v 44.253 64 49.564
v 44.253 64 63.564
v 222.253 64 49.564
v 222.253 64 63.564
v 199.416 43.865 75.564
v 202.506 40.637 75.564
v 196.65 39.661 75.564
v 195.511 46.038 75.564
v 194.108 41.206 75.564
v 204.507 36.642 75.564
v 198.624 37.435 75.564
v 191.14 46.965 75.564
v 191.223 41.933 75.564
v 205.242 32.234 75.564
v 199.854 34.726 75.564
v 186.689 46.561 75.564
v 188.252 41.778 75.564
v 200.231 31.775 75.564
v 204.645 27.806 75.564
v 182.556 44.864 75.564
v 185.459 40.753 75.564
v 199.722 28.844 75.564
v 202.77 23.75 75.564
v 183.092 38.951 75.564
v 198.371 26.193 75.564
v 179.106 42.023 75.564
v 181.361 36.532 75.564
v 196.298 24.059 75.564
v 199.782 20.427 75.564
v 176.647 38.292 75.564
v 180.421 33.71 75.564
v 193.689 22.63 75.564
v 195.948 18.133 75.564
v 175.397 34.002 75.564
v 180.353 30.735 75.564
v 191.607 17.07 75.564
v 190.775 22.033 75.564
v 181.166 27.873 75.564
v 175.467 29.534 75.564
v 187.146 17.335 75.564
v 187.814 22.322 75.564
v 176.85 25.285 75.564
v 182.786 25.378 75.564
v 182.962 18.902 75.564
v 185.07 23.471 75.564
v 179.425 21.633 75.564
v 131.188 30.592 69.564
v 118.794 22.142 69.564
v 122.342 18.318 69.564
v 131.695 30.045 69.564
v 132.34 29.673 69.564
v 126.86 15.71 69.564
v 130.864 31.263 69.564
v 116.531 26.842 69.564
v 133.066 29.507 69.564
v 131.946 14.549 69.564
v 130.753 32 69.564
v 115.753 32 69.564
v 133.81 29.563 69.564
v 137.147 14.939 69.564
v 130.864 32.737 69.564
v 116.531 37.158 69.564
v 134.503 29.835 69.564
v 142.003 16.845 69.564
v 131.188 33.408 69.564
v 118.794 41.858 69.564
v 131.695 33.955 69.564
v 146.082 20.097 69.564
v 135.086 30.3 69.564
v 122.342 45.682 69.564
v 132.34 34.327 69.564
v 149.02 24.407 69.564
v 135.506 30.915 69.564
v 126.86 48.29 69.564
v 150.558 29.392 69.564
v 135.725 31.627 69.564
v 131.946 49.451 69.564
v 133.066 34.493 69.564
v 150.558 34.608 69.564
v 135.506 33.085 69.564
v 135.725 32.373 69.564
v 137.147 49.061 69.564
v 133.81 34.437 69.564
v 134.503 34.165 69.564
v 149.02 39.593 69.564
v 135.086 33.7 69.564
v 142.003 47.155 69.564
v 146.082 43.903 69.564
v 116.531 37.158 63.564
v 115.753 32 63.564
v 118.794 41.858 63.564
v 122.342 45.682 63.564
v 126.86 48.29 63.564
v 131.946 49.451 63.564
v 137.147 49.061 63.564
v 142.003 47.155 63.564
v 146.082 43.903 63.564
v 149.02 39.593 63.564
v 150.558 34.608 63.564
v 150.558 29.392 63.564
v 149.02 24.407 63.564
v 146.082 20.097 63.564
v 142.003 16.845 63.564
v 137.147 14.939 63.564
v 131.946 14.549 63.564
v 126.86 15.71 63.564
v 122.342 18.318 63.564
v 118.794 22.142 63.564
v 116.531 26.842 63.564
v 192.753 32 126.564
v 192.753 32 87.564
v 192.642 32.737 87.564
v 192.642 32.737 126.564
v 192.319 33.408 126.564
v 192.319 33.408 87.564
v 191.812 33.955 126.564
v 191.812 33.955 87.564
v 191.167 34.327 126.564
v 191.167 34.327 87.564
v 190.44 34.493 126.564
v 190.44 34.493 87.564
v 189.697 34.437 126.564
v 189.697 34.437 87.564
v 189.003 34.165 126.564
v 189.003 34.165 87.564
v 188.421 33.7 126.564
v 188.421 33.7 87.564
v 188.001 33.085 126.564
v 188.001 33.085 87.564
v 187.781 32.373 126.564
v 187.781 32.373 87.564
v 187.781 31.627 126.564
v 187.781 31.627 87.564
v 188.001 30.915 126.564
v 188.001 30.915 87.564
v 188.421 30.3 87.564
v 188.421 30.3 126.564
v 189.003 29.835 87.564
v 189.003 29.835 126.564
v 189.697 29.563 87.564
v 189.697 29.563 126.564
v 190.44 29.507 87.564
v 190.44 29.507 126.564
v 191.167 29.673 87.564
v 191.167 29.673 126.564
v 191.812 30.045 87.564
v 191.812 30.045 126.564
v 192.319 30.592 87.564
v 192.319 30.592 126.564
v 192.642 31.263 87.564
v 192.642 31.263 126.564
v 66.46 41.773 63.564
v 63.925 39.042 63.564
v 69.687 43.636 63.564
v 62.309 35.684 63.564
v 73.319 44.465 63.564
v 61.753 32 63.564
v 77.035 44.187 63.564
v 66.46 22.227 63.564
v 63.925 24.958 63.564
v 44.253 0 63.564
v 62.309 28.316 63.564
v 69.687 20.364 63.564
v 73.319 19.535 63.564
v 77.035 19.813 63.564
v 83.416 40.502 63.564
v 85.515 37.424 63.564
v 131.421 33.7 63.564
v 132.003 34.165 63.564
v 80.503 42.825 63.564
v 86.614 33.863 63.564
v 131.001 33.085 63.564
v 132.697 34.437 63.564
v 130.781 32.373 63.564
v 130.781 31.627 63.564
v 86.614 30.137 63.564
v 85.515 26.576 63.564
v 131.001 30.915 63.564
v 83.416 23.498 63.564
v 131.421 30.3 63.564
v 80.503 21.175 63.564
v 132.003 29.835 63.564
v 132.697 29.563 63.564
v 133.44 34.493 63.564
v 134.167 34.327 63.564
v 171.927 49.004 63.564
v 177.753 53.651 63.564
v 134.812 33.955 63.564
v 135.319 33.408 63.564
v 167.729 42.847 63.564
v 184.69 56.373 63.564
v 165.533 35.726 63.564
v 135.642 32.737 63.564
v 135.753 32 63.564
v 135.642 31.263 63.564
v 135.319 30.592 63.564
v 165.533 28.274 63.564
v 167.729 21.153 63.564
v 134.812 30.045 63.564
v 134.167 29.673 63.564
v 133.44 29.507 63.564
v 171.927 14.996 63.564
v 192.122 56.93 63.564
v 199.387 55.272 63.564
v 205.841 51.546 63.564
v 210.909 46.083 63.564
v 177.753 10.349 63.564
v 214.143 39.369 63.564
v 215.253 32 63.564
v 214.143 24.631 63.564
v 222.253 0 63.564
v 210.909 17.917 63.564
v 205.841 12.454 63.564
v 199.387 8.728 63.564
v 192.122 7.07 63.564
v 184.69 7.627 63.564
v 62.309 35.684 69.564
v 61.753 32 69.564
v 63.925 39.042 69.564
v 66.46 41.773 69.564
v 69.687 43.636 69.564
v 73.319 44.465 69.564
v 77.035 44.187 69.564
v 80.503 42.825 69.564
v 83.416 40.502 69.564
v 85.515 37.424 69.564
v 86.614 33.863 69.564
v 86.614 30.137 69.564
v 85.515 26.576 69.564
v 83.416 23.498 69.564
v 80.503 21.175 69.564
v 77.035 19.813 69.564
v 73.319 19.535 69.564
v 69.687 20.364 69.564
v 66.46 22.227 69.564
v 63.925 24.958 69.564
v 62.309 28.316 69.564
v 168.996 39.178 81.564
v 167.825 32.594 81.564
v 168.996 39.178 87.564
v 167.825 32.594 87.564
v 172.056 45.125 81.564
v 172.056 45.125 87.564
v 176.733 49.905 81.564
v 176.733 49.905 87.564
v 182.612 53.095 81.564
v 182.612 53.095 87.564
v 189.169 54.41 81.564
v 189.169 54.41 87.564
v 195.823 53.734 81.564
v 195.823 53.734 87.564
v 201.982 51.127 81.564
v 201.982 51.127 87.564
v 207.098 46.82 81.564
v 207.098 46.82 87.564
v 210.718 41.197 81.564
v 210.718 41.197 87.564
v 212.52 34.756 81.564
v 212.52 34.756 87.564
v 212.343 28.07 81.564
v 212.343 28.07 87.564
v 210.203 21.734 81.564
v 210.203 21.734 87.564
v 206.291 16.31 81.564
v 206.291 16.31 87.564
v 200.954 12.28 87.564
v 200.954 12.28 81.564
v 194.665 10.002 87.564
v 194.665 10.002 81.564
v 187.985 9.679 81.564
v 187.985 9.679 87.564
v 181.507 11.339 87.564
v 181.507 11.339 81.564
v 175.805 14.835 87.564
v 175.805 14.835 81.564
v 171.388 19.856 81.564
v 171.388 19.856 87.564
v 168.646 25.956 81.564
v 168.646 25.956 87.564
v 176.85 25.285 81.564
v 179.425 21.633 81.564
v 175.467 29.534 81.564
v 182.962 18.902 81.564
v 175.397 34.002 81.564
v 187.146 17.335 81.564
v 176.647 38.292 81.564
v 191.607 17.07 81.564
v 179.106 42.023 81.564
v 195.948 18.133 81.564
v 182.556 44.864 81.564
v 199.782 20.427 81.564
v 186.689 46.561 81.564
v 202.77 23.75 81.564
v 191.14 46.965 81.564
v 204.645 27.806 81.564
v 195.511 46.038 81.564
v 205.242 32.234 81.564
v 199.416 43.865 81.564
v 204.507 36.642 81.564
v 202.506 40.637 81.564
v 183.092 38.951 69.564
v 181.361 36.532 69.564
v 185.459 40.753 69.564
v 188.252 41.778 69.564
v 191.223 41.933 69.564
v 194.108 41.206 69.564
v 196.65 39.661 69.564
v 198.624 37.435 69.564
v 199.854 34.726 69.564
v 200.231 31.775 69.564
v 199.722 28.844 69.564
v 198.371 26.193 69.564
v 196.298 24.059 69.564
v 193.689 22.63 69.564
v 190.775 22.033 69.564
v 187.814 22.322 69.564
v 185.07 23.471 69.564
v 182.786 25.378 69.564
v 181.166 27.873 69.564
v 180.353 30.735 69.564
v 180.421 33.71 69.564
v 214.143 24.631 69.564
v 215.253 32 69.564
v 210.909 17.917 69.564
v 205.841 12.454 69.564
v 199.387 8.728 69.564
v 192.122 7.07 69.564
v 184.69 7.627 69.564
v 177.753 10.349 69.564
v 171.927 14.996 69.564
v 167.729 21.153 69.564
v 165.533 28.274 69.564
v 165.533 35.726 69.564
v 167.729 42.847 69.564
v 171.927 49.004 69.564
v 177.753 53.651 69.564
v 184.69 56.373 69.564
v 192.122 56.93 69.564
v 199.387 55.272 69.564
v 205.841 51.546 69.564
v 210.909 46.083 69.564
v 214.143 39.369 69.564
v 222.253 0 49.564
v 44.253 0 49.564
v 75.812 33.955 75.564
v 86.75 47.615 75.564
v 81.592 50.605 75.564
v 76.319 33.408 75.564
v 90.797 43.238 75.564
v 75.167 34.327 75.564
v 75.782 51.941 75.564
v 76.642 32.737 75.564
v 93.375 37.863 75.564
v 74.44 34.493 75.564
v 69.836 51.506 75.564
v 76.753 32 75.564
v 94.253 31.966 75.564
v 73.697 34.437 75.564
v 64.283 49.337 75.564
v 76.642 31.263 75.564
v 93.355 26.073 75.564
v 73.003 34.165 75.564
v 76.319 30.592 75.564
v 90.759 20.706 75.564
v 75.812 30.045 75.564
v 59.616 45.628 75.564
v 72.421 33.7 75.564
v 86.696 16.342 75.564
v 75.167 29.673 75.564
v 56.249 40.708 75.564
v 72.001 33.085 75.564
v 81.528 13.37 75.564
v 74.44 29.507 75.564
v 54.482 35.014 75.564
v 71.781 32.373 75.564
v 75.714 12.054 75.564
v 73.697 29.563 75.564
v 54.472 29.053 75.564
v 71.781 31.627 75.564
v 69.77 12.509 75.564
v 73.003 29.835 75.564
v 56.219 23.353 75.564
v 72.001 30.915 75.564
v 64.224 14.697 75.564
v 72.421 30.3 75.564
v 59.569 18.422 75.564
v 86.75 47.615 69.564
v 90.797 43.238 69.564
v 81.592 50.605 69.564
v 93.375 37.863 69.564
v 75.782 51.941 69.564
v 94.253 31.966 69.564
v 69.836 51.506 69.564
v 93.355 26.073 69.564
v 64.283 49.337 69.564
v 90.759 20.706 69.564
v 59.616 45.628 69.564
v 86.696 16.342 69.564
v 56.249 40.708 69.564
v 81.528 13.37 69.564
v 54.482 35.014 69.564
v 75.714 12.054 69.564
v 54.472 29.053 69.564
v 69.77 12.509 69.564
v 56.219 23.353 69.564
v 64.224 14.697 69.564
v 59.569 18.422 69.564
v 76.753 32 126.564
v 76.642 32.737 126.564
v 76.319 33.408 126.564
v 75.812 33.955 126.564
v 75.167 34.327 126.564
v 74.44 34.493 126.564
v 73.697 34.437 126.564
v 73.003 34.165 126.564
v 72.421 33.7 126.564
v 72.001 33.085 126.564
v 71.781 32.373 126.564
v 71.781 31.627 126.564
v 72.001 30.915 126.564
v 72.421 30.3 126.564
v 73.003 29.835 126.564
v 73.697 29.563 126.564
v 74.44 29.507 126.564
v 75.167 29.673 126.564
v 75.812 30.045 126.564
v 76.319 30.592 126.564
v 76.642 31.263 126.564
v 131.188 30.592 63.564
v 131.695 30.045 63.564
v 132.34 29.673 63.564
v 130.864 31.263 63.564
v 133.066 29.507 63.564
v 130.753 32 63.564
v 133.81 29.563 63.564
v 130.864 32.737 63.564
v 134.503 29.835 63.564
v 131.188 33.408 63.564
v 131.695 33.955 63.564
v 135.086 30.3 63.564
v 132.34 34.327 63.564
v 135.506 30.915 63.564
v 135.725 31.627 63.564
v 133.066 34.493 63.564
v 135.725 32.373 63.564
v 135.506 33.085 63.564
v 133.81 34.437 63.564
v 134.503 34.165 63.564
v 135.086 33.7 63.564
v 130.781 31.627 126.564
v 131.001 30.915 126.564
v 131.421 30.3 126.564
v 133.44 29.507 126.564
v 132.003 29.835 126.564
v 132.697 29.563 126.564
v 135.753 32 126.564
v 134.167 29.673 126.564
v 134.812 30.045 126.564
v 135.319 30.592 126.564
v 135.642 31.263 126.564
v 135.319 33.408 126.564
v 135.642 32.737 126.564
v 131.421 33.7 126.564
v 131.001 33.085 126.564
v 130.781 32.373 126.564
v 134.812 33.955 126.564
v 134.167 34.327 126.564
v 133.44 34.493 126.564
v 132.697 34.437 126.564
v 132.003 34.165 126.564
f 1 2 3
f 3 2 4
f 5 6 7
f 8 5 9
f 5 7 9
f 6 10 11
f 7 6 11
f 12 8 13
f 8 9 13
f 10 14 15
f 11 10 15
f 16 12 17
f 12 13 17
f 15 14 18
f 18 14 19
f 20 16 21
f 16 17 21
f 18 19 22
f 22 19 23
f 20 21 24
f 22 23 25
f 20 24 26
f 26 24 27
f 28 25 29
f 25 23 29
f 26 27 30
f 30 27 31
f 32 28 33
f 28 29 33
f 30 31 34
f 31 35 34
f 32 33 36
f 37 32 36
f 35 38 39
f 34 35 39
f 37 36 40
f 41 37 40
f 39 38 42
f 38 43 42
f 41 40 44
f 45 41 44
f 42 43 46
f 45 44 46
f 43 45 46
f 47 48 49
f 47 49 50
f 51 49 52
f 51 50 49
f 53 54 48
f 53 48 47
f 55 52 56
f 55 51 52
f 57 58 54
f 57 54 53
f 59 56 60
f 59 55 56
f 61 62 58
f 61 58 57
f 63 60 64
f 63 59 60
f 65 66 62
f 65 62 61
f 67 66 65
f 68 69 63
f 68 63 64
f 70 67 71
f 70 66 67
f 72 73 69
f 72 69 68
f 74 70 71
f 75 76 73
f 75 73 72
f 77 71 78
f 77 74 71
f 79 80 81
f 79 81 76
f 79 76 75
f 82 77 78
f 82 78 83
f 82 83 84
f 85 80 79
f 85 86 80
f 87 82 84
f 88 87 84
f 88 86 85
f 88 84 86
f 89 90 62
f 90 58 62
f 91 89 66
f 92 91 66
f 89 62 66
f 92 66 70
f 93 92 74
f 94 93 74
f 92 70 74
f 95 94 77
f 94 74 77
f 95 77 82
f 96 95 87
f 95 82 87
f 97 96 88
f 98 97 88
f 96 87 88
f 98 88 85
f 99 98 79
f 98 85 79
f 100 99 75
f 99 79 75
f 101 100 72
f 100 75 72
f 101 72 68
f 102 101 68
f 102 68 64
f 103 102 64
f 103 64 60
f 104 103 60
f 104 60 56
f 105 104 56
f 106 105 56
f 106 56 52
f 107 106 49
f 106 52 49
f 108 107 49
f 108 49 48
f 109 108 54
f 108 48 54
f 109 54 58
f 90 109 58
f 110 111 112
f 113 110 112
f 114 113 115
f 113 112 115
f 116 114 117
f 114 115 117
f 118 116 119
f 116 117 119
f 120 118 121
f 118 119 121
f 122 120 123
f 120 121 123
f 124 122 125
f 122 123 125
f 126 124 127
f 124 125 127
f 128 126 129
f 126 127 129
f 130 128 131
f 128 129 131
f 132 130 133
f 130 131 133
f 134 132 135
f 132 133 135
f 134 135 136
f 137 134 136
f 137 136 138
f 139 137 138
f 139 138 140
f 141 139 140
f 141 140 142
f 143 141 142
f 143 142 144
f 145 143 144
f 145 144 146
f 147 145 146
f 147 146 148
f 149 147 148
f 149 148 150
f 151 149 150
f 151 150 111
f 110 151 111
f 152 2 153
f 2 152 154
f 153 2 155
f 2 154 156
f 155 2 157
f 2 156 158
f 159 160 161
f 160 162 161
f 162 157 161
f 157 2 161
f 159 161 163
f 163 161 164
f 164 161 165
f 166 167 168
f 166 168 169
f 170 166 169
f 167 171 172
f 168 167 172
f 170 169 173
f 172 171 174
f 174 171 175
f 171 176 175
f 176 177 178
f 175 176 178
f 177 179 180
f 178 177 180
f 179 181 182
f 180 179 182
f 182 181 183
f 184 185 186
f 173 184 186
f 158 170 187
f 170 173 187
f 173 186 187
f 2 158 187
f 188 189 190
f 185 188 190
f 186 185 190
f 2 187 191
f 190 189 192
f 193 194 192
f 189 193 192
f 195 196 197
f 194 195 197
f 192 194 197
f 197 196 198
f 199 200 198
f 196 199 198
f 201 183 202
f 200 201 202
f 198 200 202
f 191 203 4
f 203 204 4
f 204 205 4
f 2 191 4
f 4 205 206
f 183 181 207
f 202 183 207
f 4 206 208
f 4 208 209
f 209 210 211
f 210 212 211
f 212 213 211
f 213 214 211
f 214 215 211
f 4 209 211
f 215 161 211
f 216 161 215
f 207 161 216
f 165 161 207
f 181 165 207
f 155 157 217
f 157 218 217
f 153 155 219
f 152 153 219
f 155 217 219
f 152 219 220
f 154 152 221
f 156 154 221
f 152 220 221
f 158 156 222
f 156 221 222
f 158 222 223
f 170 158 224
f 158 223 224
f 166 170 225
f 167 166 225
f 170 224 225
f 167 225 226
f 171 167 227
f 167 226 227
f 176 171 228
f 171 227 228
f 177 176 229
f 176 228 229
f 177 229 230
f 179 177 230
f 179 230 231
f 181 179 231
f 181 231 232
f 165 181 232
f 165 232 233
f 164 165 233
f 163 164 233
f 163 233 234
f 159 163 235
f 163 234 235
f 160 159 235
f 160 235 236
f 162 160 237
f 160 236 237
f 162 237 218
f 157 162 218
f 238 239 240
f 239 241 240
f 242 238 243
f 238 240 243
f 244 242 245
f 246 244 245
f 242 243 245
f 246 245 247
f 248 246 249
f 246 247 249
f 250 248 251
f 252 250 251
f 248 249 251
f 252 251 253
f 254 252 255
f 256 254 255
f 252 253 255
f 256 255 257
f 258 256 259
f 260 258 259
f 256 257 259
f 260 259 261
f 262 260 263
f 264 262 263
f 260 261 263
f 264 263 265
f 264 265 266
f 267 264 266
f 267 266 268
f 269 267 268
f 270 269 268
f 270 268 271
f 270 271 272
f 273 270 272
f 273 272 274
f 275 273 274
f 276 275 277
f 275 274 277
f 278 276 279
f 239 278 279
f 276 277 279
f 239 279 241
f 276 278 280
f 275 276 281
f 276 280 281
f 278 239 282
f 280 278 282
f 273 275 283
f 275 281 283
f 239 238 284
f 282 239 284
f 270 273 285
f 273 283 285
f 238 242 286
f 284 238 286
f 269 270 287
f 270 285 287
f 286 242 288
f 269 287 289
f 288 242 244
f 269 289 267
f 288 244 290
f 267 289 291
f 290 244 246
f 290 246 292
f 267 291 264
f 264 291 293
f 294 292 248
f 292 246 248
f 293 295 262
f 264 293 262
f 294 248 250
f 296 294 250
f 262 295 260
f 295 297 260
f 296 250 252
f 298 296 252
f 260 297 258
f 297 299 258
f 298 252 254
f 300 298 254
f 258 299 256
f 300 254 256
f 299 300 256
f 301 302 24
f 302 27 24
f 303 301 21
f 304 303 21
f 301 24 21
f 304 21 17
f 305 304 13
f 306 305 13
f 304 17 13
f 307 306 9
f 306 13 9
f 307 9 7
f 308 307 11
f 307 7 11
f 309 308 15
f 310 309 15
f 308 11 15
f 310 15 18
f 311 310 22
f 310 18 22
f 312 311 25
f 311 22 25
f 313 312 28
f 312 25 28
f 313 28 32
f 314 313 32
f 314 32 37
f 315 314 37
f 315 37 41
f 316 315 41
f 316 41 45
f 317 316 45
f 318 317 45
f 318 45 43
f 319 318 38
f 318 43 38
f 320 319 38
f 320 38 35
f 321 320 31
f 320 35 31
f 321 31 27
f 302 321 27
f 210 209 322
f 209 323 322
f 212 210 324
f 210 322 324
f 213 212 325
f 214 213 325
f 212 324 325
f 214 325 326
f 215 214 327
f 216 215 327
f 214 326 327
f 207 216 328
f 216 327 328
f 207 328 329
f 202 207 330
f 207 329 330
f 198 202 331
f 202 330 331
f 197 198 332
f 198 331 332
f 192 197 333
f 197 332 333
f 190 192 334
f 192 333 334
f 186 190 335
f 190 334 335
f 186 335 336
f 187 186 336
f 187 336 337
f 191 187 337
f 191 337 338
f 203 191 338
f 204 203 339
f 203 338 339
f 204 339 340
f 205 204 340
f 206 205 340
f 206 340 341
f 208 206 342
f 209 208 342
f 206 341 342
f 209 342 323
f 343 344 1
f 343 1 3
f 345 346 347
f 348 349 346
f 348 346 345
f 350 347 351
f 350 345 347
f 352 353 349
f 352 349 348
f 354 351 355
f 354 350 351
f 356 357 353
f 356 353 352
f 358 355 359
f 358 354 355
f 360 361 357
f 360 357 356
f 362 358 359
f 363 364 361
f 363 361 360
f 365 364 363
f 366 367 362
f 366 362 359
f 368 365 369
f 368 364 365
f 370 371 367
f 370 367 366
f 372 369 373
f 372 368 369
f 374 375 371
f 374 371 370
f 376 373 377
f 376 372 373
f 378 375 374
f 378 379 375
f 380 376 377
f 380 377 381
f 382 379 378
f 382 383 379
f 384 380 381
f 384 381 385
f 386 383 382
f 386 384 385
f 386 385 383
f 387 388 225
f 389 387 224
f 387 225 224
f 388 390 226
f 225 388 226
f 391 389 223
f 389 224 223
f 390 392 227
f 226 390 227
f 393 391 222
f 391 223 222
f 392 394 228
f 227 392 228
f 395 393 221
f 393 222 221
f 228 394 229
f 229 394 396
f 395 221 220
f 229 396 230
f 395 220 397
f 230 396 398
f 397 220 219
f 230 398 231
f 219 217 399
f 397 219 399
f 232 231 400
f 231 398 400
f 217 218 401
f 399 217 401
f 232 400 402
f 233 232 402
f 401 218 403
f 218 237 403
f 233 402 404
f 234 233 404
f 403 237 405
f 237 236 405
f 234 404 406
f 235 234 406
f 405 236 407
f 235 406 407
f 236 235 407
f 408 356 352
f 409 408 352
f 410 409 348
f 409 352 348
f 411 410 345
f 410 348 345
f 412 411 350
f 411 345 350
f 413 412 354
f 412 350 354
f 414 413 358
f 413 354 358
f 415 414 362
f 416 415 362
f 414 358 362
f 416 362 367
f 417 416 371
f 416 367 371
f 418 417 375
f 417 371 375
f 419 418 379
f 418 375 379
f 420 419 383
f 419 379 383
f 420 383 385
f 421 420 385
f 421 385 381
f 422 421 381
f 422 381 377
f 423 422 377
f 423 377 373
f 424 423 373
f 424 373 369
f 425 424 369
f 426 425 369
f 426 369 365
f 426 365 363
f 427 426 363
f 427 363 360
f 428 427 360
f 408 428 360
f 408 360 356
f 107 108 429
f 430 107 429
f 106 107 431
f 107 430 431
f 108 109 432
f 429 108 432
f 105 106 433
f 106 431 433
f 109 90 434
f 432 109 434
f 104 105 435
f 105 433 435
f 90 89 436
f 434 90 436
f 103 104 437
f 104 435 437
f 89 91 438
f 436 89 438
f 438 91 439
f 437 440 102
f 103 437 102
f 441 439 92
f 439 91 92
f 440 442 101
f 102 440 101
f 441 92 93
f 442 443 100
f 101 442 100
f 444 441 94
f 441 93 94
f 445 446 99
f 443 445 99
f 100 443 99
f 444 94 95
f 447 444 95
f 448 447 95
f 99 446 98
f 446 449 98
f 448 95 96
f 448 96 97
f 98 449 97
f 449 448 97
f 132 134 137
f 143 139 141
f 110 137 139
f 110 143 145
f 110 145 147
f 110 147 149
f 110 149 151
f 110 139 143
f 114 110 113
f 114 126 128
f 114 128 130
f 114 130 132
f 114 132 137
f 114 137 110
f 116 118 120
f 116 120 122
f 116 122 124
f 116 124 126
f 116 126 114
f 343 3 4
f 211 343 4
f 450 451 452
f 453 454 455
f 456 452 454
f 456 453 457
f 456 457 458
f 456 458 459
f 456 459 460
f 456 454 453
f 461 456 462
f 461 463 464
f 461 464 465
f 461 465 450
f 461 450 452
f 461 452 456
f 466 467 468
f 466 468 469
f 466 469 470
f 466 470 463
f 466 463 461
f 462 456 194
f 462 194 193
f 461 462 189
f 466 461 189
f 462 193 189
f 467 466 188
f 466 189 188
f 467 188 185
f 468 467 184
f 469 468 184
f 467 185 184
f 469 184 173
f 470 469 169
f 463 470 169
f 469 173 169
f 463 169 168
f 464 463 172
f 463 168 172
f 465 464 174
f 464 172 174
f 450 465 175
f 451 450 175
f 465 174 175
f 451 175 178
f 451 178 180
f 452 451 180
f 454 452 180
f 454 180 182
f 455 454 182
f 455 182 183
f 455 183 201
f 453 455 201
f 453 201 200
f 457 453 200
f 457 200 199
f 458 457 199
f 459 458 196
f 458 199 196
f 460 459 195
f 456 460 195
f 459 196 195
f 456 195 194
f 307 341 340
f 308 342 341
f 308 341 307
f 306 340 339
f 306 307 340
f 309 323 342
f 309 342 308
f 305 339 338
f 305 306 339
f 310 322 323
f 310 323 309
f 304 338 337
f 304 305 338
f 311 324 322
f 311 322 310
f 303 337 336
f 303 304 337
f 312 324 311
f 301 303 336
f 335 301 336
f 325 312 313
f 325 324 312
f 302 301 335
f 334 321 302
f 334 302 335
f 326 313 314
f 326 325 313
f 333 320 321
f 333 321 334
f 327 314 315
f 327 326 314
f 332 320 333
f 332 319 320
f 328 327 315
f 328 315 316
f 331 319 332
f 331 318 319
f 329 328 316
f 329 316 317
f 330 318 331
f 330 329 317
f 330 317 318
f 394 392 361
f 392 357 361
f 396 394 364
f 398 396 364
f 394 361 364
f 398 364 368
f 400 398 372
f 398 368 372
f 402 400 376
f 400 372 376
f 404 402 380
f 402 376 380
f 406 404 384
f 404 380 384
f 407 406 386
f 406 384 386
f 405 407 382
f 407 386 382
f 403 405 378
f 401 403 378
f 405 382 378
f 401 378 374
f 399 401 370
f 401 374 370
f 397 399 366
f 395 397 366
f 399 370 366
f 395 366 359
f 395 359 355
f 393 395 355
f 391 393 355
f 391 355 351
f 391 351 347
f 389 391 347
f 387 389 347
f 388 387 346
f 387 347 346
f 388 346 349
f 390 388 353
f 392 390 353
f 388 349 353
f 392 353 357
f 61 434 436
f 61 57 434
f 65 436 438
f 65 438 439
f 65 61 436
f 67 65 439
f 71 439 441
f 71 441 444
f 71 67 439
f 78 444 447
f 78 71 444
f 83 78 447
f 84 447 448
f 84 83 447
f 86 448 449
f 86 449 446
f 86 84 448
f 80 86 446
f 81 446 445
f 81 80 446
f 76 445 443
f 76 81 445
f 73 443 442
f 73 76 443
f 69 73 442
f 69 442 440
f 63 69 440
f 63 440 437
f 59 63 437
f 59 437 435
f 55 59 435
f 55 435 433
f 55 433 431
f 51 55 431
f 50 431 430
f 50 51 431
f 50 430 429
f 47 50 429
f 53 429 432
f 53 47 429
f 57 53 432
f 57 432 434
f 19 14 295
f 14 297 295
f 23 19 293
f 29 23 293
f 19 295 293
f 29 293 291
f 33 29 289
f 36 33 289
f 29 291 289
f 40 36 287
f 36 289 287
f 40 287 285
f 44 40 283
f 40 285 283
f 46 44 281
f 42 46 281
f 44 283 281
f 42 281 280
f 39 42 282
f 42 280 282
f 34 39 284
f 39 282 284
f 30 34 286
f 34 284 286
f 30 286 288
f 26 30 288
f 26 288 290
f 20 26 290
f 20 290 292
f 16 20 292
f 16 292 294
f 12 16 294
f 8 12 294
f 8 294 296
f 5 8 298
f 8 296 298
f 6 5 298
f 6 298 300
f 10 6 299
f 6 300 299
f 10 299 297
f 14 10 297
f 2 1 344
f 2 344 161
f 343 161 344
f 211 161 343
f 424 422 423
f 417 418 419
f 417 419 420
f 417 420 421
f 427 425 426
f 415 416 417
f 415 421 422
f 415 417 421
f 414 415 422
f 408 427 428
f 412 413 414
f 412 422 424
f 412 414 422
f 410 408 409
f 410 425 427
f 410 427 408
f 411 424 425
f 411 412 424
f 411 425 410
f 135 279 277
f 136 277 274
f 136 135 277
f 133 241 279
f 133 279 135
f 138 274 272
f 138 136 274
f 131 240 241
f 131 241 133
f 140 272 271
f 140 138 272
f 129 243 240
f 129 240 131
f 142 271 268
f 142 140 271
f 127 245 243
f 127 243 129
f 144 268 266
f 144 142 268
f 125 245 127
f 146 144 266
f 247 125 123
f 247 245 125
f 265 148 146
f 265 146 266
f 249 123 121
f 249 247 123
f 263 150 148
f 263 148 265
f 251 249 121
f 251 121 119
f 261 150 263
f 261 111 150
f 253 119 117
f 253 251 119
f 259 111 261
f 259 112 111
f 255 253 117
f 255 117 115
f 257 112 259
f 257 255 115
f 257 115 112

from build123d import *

# Parameters (mm, degrees)
F0_W      = 178
F0_H      = 14
F1_DEPTH  = 64
F3_R      = 2.5
F4_DEPTH  = 63
F6_E10_W  = 22.5
F6_E10_H  = 6
F9_E11_W  = 10
F9_E11_H  = 6
F9_E12_W  = 15
F9_E12_H  = 6
F13_E13_W = 7.5
F13_E13_H = 6
F16_E14_W = 17.5
F16_E14_H = 6
F19_E15_W = 12.5
F19_E15_H = 6
F22_E16_W = 20
F22_E16_H = 6


with BuildPart() as f1:
    # F0 (on Front) → F1 (new body)
    with BuildSketch(Plane.XZ):
        with Locations((133.2533232272, 56.5637208223)):
            Rectangle(F0_W, F0_H)
    extrude(amount=-F1_DEPTH)

    # F3 (on face) → F4 (join)
    with BuildSketch(Plane.XY.offset(63.5637208223)):
        with Locations((74.2533232272, 32)):
            Circle(F3_R)
        with Locations((133.2533232272, 32)):
            Circle(F3_R)
        with Locations((190.2533232272, 32)):
            Circle(F3_R)
    extrude(amount=F4_DEPTH)

    # F6_E10 (on explicit) → F7 (revolve)
    with BuildSketch(Plane(origin=(192.7533232272, 32, 63.5637208223), x_dir=(1, 0, 0), z_dir=(0, -1, 0))):
        with Locations((11.25, 3)):
            Rectangle(F6_E10_W, F6_E10_H)
    revolve(axis=Axis((190.2533232272, 32, 63.5637208223), (0, 0, -1)))

    # F9_E11 (on explicit) → F10 (revolve)
    with BuildSketch(Plane(origin=(71.7533232272, 32, 63.5637208223), x_dir=(-1, 0, 0), z_dir=(0, 1, 0))):
        with Locations((5, 3)):
            Rectangle(F9_E11_W, F9_E11_H)
    revolve(axis=Axis((74.2533232272, 32, 63.5637208223), (0, 0, -1)))

    # F13_E13 (on explicit) → F14 (revolve)
    with BuildSketch(Plane(origin=(187.9158168097, 32.886602362, 69.5637208223), x_dir=(-0.8739405908, 0.4860327599, 0), z_dir=(0.4860327599, 0.8739405908, 0))):
        with Locations((3.75, 3)):
            Rectangle(F13_E13_W, F13_E13_H)
    revolve(axis=Axis((190.2533232272, 32, 63.5637208223), (0, 0, -1)))

    # F16_E14 (on explicit) → F17 (revolve)
    with BuildSketch(Plane(origin=(76.7530926524, 31.9660467851, 69.5637208223), x_dir=(1, 0, 0), z_dir=(0, -1, 0))):
        with Locations((8.75, 3)):
            Rectangle(F16_E14_W, F16_E14_H)
    revolve(axis=Axis((74.2533232272, 32, 63.5637208223), (0, 0, -1)))

    # F19_E15 (on explicit) → F20 (revolve)
    with BuildSketch(Plane(origin=(192.7423164525, 32.2343346416, 75.5637208223), x_dir=(1, 0, 0), z_dir=(0, -1, 0))):
        with Locations((6.25, 3)):
            Rectangle(F19_E15_W, F19_E15_H)
    revolve(axis=Axis((190.2533232272, 32, 63.5637208223), (0, 0, -1)))

    # F22_E16 (on explicit) → F23 (revolve)
    with BuildSketch(Plane(origin=(187.8248049644, 32.5935478477, 81.5637208223), x_dir=(-1, 0, 0), z_dir=(0, 1, 0))):
        with Locations((10, 3)):
            Rectangle(F22_E16_W, F22_E16_H)
    revolve(axis=Axis((190.2533232272, 32, 63.5637208223), (0, 0, -1)))


with BuildPart() as f11:
    # F9_E12 (on explicit) → F11 (revolve)
    with BuildSketch(Plane(origin=(130.7533232272, 32, 63.5637208223), x_dir=(-1, 0, 0), z_dir=(0, 1, 0))):
        with Locations((7.5, 3)):
            Rectangle(F9_E12_W, F9_E12_H)
    revolve(axis=Axis((133.2533232272, 32, 63.5637208223), (0, 0, -1)))


solid = Compound([f1.part, f11.part])
